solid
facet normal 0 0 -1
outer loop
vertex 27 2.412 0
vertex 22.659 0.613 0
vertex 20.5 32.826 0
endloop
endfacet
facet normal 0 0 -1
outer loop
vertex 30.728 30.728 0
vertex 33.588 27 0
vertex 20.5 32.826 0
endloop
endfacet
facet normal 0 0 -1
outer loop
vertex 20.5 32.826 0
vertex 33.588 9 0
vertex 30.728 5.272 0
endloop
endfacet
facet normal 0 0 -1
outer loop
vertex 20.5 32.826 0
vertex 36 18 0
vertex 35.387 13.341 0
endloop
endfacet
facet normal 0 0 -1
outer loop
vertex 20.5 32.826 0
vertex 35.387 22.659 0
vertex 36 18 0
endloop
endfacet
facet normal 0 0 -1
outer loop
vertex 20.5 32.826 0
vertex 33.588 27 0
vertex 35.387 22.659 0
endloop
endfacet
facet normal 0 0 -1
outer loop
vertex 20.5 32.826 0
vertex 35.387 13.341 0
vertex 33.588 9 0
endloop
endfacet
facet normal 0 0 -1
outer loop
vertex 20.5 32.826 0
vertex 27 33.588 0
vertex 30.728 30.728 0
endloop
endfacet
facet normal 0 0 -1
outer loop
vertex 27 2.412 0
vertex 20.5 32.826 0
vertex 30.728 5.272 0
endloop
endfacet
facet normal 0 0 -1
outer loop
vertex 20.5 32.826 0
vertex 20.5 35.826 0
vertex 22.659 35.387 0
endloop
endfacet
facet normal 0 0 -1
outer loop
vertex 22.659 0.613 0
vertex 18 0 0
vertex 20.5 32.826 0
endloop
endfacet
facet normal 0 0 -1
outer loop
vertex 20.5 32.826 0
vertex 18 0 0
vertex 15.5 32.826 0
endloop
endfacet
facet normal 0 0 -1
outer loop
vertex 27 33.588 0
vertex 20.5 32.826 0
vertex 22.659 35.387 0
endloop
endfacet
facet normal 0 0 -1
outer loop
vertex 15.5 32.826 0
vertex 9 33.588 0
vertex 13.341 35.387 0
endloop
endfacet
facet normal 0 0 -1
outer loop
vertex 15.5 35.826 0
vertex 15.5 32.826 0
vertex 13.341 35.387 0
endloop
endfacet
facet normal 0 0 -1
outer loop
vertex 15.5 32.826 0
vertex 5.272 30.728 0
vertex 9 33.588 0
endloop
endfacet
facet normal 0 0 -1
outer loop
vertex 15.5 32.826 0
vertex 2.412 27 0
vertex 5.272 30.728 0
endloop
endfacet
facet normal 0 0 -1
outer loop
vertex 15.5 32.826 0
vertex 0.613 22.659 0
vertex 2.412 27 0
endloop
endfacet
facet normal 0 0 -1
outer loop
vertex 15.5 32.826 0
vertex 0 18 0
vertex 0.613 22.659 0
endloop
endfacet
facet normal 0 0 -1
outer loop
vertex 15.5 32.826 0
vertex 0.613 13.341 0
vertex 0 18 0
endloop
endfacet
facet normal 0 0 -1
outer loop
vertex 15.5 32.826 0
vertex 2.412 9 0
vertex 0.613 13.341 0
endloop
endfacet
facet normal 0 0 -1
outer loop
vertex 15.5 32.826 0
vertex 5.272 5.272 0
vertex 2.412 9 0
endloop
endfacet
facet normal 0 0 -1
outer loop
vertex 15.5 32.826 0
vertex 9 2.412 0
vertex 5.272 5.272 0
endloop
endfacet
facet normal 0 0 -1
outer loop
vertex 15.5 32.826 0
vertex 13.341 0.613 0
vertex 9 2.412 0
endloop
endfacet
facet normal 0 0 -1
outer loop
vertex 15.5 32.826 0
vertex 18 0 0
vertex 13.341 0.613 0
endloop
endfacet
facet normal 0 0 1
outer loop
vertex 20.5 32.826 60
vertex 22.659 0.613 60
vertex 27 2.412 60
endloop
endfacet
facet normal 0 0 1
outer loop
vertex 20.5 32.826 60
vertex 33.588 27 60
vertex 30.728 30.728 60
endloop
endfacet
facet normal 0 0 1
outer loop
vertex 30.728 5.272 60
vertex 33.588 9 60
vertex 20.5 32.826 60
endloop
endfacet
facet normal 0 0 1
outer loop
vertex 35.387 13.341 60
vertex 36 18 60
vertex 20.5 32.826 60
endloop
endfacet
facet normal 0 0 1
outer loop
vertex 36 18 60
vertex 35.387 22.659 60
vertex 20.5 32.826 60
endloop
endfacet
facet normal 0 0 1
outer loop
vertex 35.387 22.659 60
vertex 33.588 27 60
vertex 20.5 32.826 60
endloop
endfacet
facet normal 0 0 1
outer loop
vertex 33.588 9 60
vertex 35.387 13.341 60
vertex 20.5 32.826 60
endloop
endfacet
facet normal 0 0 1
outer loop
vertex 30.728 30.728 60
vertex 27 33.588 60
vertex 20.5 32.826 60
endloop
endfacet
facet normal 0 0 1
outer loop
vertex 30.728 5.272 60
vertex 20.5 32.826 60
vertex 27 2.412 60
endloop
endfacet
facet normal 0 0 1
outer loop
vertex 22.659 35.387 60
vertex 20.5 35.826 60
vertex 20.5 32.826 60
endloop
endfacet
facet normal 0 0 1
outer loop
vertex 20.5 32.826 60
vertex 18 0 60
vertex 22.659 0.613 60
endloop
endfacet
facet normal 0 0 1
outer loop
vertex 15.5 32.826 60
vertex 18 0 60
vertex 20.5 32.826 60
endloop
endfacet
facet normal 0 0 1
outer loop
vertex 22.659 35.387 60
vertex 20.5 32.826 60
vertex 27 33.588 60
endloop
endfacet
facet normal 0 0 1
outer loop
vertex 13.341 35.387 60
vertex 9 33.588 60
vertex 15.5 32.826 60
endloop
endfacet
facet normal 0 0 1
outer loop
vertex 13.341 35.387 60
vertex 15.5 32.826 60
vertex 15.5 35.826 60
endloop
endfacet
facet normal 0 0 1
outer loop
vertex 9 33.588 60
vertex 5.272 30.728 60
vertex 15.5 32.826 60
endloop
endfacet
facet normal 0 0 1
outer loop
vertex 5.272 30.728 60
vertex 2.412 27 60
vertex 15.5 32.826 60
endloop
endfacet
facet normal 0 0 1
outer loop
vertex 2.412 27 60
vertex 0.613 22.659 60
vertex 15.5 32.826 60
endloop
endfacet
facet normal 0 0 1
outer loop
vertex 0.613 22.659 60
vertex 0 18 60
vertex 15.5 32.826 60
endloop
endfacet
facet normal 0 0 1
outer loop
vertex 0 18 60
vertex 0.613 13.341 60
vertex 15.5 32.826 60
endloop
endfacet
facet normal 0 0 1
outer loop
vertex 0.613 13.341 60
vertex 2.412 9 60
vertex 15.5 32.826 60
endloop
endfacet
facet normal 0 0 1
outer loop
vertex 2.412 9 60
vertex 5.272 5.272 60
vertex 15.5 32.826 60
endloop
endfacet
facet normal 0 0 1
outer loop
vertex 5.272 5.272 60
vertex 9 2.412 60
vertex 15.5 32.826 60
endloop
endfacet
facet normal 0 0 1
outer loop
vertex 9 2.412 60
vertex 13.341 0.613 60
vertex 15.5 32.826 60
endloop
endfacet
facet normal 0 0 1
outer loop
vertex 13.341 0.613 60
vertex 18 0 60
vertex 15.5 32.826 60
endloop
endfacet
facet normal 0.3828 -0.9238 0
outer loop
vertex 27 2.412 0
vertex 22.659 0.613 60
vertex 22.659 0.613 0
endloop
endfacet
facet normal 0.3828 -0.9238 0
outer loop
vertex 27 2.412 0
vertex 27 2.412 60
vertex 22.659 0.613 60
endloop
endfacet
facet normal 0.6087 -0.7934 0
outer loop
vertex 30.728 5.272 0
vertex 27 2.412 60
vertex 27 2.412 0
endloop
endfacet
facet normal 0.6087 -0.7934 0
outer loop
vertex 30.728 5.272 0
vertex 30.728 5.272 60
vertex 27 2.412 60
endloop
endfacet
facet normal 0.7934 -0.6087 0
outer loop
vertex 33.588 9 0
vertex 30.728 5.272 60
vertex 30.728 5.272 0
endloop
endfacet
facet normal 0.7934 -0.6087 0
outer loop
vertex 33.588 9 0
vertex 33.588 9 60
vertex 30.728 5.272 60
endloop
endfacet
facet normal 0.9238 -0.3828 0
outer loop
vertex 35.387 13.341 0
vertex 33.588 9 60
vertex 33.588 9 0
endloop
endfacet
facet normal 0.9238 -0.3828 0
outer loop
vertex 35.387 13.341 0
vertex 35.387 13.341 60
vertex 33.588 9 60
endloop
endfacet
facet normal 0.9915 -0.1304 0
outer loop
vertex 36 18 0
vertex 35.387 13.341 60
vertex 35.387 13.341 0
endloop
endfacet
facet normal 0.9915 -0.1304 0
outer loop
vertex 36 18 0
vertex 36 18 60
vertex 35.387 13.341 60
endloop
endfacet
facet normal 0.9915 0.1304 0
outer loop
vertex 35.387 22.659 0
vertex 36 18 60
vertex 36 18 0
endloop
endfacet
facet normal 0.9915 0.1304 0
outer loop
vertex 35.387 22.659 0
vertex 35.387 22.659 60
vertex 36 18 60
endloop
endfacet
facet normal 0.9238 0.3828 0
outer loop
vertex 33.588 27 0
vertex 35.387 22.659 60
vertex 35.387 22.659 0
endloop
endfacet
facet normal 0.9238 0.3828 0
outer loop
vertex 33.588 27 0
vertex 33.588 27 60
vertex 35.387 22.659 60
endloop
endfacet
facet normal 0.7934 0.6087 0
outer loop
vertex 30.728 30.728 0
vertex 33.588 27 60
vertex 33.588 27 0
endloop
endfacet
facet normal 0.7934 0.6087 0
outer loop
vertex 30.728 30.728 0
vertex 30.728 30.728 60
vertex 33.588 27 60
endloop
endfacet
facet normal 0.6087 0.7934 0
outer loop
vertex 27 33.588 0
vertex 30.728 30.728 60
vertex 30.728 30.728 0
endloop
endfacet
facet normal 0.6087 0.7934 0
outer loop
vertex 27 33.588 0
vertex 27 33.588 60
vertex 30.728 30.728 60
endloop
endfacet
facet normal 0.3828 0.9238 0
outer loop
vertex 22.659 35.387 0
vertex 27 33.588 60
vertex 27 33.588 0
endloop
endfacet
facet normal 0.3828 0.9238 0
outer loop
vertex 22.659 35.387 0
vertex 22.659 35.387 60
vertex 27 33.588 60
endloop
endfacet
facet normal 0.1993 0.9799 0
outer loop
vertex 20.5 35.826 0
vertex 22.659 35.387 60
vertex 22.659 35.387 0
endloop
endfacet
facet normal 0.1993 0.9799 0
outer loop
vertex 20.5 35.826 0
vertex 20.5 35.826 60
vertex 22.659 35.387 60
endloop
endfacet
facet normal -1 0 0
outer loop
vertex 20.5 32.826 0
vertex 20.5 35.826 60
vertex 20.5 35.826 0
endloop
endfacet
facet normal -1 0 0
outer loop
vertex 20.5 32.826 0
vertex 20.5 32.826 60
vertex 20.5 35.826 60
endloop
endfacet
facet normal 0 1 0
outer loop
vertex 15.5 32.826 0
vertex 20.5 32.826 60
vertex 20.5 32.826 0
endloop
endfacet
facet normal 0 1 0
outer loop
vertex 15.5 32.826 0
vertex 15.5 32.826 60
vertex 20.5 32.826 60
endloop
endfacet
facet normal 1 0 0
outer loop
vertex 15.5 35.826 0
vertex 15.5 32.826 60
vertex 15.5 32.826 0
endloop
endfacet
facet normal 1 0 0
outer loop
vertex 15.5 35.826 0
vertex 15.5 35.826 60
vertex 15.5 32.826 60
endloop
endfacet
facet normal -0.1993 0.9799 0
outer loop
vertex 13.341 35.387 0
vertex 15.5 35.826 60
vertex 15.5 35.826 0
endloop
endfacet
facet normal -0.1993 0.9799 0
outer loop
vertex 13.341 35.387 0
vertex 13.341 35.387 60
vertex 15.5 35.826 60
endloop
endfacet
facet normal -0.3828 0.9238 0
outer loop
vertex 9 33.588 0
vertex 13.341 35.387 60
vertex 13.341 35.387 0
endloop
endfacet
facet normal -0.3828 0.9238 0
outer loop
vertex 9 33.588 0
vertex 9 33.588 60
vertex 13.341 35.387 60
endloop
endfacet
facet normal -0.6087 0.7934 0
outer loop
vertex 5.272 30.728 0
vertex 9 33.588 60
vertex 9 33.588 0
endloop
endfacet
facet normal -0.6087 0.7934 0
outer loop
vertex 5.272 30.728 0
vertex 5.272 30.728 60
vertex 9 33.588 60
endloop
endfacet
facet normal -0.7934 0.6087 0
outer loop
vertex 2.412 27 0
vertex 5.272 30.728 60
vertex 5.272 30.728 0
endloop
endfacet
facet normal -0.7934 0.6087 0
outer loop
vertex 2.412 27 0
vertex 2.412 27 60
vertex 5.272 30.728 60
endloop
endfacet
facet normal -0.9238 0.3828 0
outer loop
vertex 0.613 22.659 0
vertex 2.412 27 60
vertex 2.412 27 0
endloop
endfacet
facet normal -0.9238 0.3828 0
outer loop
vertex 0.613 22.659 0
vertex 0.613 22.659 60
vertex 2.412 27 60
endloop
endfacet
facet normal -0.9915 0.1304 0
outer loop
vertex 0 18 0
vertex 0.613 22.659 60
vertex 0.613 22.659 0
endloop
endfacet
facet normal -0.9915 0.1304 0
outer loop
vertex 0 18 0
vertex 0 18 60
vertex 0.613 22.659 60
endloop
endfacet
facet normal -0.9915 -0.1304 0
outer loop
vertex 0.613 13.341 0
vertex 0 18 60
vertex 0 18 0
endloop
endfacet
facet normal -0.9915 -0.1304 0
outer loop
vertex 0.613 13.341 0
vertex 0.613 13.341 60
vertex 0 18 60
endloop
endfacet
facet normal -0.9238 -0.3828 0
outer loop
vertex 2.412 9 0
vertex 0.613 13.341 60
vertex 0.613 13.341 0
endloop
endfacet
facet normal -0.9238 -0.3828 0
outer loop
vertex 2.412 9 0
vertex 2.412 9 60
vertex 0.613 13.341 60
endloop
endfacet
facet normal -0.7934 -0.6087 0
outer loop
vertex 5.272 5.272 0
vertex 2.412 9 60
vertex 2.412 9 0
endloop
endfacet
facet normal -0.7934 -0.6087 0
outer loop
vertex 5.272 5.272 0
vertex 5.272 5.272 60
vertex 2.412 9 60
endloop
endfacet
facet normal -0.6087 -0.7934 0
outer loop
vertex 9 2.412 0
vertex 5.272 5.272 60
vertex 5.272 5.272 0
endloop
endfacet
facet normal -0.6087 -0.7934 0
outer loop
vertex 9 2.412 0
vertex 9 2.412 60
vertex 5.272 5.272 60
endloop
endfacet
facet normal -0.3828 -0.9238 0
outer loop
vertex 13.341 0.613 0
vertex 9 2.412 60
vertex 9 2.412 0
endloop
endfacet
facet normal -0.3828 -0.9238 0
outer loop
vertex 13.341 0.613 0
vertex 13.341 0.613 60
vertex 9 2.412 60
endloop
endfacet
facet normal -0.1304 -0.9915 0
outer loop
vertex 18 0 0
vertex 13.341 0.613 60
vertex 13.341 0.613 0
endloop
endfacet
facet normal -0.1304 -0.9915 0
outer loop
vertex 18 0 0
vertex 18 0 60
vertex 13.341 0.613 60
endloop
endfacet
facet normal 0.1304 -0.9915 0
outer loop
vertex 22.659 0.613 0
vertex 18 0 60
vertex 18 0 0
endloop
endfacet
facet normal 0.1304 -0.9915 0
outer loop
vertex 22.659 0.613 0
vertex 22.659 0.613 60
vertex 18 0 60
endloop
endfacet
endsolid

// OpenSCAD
$fn = 32;

// ----------------------------------------------------------------------
// Keyway shaft: d36 shaft, key 5 x 3 mm
// ----------------------------------------------------------------------

// --- parameters (mm) ---
shaft_r = 18;             // shaft radius
key_w = 5;                // keyway width
key_d = 3;                // keyway depth below the surface line
plate_t = 60;             // shaft length, Z (extrusion height)

shaft_d = 2 * shaft_r;  // shaft diameter
circle_step = 15;  // polygon sampling step, degrees

profile = [[13.341, 35.387], [9, 33.588], [5.272, 30.728], [2.412, 27], [0.613, 22.659], [0, 18], [0.613, 13.341], [2.412, 9], [5.272, 5.272], [9, 2.412], [13.341, 0.613], [18, 0], [22.659, 0.613], [27, 2.412], [30.728, 5.272], [33.588, 9], [35.387, 13.341], [36, 18], [35.387, 22.659], [33.588, 27], [30.728, 30.728], [27, 33.588], [22.659, 35.387], [20.5, 35.826], [20.5, 32.826], [15.5, 32.826], [15.5, 35.826]];  // primary outline, 27 points, counter clockwise

// --- the one profile operation ---
linear_extrude(height = plate_t) polygon(points = profile);
